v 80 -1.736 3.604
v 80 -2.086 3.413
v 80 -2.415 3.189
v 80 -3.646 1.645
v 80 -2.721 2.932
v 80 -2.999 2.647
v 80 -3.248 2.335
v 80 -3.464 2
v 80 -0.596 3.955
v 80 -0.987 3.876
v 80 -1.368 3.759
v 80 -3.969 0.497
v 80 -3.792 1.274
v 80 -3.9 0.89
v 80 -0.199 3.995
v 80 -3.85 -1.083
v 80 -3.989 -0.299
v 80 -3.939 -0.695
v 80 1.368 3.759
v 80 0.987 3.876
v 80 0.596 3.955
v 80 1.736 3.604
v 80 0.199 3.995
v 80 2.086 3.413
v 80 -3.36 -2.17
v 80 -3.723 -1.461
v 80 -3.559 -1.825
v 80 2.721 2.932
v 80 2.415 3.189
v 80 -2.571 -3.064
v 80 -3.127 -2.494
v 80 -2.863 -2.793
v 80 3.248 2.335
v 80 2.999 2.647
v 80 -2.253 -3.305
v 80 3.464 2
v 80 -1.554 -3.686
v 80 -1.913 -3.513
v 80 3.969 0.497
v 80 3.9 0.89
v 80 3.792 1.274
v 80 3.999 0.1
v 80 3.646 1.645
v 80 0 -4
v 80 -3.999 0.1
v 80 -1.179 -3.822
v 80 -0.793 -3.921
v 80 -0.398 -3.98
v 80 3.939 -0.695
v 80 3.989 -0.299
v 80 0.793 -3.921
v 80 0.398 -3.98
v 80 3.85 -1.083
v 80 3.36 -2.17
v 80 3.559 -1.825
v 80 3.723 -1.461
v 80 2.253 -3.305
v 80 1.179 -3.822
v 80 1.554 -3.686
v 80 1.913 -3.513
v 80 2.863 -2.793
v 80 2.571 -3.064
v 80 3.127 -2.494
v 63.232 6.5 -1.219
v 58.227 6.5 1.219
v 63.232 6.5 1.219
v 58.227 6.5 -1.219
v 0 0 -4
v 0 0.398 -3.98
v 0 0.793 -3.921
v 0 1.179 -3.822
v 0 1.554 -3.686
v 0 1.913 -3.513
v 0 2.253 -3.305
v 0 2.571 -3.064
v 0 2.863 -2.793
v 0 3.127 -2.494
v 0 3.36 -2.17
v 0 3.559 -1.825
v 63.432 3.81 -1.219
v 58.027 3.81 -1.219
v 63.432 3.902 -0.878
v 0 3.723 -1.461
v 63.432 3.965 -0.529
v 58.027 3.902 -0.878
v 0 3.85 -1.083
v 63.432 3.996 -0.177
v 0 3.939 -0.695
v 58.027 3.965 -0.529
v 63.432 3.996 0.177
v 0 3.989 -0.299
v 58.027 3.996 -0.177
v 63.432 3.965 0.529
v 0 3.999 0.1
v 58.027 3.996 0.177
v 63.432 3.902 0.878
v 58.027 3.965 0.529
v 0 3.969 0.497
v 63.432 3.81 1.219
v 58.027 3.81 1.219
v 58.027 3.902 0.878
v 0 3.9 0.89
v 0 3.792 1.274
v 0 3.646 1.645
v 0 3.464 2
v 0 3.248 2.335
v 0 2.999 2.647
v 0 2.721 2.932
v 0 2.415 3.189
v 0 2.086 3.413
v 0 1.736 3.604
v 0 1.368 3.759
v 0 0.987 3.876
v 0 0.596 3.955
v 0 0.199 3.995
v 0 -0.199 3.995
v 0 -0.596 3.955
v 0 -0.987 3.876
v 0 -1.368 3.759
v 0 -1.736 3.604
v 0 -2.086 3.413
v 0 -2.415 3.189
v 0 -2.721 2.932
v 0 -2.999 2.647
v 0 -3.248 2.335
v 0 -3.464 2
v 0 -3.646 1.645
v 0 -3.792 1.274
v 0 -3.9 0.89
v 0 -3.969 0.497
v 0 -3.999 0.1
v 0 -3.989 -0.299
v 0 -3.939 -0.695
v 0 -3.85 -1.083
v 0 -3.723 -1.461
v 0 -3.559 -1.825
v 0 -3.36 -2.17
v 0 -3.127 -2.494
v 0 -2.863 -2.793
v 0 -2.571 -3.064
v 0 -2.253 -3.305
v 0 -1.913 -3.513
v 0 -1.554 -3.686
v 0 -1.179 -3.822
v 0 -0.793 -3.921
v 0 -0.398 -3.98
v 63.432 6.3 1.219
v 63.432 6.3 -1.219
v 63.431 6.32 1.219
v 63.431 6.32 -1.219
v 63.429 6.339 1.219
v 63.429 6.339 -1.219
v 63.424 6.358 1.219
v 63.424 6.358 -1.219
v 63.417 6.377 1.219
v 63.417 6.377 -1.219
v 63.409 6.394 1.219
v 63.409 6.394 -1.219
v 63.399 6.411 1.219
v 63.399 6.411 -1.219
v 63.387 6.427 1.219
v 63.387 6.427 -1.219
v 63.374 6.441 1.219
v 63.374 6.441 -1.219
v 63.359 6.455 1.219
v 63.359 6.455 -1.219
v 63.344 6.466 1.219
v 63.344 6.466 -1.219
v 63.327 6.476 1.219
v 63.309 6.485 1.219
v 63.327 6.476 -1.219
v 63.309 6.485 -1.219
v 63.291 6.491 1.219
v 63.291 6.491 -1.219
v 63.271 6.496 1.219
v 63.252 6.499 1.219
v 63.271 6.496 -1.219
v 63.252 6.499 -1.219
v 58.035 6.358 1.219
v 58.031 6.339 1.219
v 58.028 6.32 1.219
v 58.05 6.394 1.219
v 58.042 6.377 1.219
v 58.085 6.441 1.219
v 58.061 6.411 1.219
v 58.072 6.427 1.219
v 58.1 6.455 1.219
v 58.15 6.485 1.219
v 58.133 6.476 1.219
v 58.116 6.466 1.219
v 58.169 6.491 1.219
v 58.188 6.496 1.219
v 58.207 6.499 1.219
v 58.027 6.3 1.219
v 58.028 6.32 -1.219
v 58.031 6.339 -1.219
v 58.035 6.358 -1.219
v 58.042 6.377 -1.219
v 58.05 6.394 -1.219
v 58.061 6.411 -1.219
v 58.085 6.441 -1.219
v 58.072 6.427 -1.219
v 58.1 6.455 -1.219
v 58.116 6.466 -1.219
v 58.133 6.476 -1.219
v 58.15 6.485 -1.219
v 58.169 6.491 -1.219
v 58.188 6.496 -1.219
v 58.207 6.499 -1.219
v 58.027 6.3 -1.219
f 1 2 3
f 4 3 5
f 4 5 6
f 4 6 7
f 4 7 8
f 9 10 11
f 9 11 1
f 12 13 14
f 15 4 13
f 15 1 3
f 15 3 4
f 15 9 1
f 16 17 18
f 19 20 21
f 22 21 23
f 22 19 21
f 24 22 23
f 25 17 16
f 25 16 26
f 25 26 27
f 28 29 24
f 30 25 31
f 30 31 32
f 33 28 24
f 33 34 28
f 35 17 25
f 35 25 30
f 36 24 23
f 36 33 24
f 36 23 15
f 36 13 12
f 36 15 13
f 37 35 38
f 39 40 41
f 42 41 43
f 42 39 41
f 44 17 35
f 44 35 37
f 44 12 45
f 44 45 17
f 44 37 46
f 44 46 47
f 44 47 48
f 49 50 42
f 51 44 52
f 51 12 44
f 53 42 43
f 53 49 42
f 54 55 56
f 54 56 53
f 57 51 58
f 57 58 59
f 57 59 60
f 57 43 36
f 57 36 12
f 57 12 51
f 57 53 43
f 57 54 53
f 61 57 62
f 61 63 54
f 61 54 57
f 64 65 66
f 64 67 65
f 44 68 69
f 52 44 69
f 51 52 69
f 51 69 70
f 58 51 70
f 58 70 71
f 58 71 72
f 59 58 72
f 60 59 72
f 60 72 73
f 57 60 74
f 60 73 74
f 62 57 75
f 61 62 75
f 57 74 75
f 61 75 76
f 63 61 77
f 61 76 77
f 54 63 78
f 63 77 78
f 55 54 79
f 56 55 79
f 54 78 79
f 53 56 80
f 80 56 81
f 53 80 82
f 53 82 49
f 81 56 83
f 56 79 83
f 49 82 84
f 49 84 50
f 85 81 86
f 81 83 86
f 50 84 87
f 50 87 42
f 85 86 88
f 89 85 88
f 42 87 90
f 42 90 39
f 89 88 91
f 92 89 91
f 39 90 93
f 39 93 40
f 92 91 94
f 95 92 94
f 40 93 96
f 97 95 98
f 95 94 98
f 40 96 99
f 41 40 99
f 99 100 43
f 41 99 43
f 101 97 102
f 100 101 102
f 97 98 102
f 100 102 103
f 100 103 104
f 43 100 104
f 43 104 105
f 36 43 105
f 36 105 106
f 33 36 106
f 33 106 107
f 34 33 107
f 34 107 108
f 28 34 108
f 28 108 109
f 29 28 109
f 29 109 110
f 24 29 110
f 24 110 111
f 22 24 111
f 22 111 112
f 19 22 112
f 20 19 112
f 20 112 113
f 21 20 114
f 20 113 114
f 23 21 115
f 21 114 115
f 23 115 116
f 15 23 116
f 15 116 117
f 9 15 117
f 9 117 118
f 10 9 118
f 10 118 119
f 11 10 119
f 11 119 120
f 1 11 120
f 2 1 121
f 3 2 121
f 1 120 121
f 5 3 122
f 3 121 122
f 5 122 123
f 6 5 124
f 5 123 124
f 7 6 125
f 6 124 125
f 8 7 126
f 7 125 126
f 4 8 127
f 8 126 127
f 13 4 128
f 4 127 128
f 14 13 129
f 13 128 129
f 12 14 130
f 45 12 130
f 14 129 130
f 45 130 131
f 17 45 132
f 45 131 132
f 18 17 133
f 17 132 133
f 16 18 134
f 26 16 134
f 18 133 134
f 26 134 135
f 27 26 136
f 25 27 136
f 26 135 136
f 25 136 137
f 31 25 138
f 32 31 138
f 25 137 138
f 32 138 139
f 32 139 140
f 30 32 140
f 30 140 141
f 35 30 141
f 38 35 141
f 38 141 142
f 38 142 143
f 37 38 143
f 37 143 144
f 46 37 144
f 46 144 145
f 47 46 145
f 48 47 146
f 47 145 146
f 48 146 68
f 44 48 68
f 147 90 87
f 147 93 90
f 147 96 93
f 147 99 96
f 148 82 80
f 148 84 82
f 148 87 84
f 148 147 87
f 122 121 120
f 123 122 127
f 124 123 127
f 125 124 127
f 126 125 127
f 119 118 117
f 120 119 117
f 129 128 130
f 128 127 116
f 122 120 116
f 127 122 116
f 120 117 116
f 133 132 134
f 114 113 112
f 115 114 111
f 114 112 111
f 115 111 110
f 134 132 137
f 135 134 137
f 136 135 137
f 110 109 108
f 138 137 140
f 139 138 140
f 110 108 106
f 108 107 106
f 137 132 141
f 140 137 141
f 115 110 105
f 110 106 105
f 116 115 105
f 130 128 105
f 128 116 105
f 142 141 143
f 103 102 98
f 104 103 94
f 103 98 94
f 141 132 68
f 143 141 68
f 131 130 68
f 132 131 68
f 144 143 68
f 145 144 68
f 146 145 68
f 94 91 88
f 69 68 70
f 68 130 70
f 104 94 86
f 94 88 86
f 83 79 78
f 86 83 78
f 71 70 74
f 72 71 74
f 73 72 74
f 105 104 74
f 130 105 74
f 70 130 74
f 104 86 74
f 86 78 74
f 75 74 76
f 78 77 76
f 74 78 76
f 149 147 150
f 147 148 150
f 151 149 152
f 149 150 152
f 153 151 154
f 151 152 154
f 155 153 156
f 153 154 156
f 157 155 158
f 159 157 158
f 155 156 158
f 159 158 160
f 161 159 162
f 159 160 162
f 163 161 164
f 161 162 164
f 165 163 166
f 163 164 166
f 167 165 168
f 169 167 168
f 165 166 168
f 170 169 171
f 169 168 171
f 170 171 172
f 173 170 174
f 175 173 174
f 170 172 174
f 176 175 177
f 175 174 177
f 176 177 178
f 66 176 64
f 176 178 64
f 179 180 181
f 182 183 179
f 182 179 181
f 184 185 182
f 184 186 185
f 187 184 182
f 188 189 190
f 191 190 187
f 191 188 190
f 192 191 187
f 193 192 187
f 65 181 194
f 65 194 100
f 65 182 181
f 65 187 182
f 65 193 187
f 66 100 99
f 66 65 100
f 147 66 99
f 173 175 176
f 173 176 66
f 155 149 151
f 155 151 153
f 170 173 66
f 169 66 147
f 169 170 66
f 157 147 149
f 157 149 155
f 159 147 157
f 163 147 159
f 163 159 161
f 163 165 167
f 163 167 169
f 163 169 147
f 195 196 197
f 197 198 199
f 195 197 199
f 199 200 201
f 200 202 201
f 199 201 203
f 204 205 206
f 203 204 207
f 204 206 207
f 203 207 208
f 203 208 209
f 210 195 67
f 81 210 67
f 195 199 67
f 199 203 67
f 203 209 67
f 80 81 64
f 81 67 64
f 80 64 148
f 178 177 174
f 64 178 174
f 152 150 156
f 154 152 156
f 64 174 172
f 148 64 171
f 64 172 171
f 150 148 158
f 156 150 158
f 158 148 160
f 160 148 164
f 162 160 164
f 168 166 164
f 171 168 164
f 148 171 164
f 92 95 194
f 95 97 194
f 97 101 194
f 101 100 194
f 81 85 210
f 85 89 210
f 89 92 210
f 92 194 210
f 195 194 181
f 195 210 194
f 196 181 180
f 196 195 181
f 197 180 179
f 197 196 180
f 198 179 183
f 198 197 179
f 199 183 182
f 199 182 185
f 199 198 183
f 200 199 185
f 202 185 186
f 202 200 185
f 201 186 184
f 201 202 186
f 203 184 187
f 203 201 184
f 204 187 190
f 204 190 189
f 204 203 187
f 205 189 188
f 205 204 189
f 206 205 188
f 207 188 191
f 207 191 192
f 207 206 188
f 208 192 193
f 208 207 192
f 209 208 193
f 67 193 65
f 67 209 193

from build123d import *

# Parameters (mm, degrees)
SKETCH1_R                            = 4
BOSS_EXTRUDE1_DEPTH                  = 80
SKETCH2_W                            = 5.405623026
SKETCH2_H                            = 2.438582992
BOSS_EXTRUDE3_DEPTH                  = 2.5
BOSS_EXTRUDE3_DIRECTION_2_REACH      = 82.498
BOSS_EXTRUDE3_DIRECTION_2_END_RADIUS = 4
FILLET2_R                            = 0.2


with BuildPart() as part:
    # Sketch1 → Boss-Extrude1 (new body)
    with BuildSketch(Plane(origin=(0, 0, 0), x_dir=(0, 0, -1), z_dir=(1, 0, 0))):
        Circle(SKETCH1_R)
    extrude(amount=BOSS_EXTRUDE1_DEPTH)

    # Sketch2 → Boss-Extrude3 (add)
    with BuildSketch(Plane(origin=(0, 4, 0), x_dir=(1, 0, 0), z_dir=(0, 1, 0))):
        with Locations((60.729644263, 0)):
            Rectangle(SKETCH2_W, SKETCH2_H)
    extrude(amount=BOSS_EXTRUDE3_DEPTH)

    # Boss-Extrude3 direction 2: up to this cylinder (the profile starts outside it)
    boss_extrude3_direction_2_end = Plane(origin=(60.729644, 0, 0), z_dir=(-1, 0, 0)) * Cylinder(BOSS_EXTRUDE3_DIRECTION_2_END_RADIUS, 173.996, mode=Mode.PRIVATE)
    # Sketch2 → Boss-Extrude3 direction 2 (add, up to the surface)
    with BuildSketch(Plane(origin=(0, 4, 0), x_dir=(1, 0, 0), z_dir=(0, 1, 0)), mode=Mode.PRIVATE) as boss_extrude3_direction_2_sk1:
        with Locations((60.729644263, 0)):
            Rectangle(SKETCH2_W, SKETCH2_H)
    boss_extrude3_direction_2_tool1 = extrude(boss_extrude3_direction_2_sk1.sketch, amount=-BOSS_EXTRUDE3_DIRECTION_2_REACH, mode=Mode.PRIVATE) - boss_extrude3_direction_2_end
    add(boss_extrude3_direction_2_tool1.solids().sort_by_distance((60.729644, 4, 0))[0])
    add(boss_extrude3_direction_2_tool1.solids().sort_by_distance((60.729644, 4, 0))[1])

    # Fillet2
    fillet2_edges = [part.edges().sort_by_distance(p)[0] for p in [
        (63.432455776, 6.5, 0),
        (58.02683275, 6.5, 0),
    ]]
    fillet(fillet2_edges, radius=FILLET2_R)


solid = part.part
